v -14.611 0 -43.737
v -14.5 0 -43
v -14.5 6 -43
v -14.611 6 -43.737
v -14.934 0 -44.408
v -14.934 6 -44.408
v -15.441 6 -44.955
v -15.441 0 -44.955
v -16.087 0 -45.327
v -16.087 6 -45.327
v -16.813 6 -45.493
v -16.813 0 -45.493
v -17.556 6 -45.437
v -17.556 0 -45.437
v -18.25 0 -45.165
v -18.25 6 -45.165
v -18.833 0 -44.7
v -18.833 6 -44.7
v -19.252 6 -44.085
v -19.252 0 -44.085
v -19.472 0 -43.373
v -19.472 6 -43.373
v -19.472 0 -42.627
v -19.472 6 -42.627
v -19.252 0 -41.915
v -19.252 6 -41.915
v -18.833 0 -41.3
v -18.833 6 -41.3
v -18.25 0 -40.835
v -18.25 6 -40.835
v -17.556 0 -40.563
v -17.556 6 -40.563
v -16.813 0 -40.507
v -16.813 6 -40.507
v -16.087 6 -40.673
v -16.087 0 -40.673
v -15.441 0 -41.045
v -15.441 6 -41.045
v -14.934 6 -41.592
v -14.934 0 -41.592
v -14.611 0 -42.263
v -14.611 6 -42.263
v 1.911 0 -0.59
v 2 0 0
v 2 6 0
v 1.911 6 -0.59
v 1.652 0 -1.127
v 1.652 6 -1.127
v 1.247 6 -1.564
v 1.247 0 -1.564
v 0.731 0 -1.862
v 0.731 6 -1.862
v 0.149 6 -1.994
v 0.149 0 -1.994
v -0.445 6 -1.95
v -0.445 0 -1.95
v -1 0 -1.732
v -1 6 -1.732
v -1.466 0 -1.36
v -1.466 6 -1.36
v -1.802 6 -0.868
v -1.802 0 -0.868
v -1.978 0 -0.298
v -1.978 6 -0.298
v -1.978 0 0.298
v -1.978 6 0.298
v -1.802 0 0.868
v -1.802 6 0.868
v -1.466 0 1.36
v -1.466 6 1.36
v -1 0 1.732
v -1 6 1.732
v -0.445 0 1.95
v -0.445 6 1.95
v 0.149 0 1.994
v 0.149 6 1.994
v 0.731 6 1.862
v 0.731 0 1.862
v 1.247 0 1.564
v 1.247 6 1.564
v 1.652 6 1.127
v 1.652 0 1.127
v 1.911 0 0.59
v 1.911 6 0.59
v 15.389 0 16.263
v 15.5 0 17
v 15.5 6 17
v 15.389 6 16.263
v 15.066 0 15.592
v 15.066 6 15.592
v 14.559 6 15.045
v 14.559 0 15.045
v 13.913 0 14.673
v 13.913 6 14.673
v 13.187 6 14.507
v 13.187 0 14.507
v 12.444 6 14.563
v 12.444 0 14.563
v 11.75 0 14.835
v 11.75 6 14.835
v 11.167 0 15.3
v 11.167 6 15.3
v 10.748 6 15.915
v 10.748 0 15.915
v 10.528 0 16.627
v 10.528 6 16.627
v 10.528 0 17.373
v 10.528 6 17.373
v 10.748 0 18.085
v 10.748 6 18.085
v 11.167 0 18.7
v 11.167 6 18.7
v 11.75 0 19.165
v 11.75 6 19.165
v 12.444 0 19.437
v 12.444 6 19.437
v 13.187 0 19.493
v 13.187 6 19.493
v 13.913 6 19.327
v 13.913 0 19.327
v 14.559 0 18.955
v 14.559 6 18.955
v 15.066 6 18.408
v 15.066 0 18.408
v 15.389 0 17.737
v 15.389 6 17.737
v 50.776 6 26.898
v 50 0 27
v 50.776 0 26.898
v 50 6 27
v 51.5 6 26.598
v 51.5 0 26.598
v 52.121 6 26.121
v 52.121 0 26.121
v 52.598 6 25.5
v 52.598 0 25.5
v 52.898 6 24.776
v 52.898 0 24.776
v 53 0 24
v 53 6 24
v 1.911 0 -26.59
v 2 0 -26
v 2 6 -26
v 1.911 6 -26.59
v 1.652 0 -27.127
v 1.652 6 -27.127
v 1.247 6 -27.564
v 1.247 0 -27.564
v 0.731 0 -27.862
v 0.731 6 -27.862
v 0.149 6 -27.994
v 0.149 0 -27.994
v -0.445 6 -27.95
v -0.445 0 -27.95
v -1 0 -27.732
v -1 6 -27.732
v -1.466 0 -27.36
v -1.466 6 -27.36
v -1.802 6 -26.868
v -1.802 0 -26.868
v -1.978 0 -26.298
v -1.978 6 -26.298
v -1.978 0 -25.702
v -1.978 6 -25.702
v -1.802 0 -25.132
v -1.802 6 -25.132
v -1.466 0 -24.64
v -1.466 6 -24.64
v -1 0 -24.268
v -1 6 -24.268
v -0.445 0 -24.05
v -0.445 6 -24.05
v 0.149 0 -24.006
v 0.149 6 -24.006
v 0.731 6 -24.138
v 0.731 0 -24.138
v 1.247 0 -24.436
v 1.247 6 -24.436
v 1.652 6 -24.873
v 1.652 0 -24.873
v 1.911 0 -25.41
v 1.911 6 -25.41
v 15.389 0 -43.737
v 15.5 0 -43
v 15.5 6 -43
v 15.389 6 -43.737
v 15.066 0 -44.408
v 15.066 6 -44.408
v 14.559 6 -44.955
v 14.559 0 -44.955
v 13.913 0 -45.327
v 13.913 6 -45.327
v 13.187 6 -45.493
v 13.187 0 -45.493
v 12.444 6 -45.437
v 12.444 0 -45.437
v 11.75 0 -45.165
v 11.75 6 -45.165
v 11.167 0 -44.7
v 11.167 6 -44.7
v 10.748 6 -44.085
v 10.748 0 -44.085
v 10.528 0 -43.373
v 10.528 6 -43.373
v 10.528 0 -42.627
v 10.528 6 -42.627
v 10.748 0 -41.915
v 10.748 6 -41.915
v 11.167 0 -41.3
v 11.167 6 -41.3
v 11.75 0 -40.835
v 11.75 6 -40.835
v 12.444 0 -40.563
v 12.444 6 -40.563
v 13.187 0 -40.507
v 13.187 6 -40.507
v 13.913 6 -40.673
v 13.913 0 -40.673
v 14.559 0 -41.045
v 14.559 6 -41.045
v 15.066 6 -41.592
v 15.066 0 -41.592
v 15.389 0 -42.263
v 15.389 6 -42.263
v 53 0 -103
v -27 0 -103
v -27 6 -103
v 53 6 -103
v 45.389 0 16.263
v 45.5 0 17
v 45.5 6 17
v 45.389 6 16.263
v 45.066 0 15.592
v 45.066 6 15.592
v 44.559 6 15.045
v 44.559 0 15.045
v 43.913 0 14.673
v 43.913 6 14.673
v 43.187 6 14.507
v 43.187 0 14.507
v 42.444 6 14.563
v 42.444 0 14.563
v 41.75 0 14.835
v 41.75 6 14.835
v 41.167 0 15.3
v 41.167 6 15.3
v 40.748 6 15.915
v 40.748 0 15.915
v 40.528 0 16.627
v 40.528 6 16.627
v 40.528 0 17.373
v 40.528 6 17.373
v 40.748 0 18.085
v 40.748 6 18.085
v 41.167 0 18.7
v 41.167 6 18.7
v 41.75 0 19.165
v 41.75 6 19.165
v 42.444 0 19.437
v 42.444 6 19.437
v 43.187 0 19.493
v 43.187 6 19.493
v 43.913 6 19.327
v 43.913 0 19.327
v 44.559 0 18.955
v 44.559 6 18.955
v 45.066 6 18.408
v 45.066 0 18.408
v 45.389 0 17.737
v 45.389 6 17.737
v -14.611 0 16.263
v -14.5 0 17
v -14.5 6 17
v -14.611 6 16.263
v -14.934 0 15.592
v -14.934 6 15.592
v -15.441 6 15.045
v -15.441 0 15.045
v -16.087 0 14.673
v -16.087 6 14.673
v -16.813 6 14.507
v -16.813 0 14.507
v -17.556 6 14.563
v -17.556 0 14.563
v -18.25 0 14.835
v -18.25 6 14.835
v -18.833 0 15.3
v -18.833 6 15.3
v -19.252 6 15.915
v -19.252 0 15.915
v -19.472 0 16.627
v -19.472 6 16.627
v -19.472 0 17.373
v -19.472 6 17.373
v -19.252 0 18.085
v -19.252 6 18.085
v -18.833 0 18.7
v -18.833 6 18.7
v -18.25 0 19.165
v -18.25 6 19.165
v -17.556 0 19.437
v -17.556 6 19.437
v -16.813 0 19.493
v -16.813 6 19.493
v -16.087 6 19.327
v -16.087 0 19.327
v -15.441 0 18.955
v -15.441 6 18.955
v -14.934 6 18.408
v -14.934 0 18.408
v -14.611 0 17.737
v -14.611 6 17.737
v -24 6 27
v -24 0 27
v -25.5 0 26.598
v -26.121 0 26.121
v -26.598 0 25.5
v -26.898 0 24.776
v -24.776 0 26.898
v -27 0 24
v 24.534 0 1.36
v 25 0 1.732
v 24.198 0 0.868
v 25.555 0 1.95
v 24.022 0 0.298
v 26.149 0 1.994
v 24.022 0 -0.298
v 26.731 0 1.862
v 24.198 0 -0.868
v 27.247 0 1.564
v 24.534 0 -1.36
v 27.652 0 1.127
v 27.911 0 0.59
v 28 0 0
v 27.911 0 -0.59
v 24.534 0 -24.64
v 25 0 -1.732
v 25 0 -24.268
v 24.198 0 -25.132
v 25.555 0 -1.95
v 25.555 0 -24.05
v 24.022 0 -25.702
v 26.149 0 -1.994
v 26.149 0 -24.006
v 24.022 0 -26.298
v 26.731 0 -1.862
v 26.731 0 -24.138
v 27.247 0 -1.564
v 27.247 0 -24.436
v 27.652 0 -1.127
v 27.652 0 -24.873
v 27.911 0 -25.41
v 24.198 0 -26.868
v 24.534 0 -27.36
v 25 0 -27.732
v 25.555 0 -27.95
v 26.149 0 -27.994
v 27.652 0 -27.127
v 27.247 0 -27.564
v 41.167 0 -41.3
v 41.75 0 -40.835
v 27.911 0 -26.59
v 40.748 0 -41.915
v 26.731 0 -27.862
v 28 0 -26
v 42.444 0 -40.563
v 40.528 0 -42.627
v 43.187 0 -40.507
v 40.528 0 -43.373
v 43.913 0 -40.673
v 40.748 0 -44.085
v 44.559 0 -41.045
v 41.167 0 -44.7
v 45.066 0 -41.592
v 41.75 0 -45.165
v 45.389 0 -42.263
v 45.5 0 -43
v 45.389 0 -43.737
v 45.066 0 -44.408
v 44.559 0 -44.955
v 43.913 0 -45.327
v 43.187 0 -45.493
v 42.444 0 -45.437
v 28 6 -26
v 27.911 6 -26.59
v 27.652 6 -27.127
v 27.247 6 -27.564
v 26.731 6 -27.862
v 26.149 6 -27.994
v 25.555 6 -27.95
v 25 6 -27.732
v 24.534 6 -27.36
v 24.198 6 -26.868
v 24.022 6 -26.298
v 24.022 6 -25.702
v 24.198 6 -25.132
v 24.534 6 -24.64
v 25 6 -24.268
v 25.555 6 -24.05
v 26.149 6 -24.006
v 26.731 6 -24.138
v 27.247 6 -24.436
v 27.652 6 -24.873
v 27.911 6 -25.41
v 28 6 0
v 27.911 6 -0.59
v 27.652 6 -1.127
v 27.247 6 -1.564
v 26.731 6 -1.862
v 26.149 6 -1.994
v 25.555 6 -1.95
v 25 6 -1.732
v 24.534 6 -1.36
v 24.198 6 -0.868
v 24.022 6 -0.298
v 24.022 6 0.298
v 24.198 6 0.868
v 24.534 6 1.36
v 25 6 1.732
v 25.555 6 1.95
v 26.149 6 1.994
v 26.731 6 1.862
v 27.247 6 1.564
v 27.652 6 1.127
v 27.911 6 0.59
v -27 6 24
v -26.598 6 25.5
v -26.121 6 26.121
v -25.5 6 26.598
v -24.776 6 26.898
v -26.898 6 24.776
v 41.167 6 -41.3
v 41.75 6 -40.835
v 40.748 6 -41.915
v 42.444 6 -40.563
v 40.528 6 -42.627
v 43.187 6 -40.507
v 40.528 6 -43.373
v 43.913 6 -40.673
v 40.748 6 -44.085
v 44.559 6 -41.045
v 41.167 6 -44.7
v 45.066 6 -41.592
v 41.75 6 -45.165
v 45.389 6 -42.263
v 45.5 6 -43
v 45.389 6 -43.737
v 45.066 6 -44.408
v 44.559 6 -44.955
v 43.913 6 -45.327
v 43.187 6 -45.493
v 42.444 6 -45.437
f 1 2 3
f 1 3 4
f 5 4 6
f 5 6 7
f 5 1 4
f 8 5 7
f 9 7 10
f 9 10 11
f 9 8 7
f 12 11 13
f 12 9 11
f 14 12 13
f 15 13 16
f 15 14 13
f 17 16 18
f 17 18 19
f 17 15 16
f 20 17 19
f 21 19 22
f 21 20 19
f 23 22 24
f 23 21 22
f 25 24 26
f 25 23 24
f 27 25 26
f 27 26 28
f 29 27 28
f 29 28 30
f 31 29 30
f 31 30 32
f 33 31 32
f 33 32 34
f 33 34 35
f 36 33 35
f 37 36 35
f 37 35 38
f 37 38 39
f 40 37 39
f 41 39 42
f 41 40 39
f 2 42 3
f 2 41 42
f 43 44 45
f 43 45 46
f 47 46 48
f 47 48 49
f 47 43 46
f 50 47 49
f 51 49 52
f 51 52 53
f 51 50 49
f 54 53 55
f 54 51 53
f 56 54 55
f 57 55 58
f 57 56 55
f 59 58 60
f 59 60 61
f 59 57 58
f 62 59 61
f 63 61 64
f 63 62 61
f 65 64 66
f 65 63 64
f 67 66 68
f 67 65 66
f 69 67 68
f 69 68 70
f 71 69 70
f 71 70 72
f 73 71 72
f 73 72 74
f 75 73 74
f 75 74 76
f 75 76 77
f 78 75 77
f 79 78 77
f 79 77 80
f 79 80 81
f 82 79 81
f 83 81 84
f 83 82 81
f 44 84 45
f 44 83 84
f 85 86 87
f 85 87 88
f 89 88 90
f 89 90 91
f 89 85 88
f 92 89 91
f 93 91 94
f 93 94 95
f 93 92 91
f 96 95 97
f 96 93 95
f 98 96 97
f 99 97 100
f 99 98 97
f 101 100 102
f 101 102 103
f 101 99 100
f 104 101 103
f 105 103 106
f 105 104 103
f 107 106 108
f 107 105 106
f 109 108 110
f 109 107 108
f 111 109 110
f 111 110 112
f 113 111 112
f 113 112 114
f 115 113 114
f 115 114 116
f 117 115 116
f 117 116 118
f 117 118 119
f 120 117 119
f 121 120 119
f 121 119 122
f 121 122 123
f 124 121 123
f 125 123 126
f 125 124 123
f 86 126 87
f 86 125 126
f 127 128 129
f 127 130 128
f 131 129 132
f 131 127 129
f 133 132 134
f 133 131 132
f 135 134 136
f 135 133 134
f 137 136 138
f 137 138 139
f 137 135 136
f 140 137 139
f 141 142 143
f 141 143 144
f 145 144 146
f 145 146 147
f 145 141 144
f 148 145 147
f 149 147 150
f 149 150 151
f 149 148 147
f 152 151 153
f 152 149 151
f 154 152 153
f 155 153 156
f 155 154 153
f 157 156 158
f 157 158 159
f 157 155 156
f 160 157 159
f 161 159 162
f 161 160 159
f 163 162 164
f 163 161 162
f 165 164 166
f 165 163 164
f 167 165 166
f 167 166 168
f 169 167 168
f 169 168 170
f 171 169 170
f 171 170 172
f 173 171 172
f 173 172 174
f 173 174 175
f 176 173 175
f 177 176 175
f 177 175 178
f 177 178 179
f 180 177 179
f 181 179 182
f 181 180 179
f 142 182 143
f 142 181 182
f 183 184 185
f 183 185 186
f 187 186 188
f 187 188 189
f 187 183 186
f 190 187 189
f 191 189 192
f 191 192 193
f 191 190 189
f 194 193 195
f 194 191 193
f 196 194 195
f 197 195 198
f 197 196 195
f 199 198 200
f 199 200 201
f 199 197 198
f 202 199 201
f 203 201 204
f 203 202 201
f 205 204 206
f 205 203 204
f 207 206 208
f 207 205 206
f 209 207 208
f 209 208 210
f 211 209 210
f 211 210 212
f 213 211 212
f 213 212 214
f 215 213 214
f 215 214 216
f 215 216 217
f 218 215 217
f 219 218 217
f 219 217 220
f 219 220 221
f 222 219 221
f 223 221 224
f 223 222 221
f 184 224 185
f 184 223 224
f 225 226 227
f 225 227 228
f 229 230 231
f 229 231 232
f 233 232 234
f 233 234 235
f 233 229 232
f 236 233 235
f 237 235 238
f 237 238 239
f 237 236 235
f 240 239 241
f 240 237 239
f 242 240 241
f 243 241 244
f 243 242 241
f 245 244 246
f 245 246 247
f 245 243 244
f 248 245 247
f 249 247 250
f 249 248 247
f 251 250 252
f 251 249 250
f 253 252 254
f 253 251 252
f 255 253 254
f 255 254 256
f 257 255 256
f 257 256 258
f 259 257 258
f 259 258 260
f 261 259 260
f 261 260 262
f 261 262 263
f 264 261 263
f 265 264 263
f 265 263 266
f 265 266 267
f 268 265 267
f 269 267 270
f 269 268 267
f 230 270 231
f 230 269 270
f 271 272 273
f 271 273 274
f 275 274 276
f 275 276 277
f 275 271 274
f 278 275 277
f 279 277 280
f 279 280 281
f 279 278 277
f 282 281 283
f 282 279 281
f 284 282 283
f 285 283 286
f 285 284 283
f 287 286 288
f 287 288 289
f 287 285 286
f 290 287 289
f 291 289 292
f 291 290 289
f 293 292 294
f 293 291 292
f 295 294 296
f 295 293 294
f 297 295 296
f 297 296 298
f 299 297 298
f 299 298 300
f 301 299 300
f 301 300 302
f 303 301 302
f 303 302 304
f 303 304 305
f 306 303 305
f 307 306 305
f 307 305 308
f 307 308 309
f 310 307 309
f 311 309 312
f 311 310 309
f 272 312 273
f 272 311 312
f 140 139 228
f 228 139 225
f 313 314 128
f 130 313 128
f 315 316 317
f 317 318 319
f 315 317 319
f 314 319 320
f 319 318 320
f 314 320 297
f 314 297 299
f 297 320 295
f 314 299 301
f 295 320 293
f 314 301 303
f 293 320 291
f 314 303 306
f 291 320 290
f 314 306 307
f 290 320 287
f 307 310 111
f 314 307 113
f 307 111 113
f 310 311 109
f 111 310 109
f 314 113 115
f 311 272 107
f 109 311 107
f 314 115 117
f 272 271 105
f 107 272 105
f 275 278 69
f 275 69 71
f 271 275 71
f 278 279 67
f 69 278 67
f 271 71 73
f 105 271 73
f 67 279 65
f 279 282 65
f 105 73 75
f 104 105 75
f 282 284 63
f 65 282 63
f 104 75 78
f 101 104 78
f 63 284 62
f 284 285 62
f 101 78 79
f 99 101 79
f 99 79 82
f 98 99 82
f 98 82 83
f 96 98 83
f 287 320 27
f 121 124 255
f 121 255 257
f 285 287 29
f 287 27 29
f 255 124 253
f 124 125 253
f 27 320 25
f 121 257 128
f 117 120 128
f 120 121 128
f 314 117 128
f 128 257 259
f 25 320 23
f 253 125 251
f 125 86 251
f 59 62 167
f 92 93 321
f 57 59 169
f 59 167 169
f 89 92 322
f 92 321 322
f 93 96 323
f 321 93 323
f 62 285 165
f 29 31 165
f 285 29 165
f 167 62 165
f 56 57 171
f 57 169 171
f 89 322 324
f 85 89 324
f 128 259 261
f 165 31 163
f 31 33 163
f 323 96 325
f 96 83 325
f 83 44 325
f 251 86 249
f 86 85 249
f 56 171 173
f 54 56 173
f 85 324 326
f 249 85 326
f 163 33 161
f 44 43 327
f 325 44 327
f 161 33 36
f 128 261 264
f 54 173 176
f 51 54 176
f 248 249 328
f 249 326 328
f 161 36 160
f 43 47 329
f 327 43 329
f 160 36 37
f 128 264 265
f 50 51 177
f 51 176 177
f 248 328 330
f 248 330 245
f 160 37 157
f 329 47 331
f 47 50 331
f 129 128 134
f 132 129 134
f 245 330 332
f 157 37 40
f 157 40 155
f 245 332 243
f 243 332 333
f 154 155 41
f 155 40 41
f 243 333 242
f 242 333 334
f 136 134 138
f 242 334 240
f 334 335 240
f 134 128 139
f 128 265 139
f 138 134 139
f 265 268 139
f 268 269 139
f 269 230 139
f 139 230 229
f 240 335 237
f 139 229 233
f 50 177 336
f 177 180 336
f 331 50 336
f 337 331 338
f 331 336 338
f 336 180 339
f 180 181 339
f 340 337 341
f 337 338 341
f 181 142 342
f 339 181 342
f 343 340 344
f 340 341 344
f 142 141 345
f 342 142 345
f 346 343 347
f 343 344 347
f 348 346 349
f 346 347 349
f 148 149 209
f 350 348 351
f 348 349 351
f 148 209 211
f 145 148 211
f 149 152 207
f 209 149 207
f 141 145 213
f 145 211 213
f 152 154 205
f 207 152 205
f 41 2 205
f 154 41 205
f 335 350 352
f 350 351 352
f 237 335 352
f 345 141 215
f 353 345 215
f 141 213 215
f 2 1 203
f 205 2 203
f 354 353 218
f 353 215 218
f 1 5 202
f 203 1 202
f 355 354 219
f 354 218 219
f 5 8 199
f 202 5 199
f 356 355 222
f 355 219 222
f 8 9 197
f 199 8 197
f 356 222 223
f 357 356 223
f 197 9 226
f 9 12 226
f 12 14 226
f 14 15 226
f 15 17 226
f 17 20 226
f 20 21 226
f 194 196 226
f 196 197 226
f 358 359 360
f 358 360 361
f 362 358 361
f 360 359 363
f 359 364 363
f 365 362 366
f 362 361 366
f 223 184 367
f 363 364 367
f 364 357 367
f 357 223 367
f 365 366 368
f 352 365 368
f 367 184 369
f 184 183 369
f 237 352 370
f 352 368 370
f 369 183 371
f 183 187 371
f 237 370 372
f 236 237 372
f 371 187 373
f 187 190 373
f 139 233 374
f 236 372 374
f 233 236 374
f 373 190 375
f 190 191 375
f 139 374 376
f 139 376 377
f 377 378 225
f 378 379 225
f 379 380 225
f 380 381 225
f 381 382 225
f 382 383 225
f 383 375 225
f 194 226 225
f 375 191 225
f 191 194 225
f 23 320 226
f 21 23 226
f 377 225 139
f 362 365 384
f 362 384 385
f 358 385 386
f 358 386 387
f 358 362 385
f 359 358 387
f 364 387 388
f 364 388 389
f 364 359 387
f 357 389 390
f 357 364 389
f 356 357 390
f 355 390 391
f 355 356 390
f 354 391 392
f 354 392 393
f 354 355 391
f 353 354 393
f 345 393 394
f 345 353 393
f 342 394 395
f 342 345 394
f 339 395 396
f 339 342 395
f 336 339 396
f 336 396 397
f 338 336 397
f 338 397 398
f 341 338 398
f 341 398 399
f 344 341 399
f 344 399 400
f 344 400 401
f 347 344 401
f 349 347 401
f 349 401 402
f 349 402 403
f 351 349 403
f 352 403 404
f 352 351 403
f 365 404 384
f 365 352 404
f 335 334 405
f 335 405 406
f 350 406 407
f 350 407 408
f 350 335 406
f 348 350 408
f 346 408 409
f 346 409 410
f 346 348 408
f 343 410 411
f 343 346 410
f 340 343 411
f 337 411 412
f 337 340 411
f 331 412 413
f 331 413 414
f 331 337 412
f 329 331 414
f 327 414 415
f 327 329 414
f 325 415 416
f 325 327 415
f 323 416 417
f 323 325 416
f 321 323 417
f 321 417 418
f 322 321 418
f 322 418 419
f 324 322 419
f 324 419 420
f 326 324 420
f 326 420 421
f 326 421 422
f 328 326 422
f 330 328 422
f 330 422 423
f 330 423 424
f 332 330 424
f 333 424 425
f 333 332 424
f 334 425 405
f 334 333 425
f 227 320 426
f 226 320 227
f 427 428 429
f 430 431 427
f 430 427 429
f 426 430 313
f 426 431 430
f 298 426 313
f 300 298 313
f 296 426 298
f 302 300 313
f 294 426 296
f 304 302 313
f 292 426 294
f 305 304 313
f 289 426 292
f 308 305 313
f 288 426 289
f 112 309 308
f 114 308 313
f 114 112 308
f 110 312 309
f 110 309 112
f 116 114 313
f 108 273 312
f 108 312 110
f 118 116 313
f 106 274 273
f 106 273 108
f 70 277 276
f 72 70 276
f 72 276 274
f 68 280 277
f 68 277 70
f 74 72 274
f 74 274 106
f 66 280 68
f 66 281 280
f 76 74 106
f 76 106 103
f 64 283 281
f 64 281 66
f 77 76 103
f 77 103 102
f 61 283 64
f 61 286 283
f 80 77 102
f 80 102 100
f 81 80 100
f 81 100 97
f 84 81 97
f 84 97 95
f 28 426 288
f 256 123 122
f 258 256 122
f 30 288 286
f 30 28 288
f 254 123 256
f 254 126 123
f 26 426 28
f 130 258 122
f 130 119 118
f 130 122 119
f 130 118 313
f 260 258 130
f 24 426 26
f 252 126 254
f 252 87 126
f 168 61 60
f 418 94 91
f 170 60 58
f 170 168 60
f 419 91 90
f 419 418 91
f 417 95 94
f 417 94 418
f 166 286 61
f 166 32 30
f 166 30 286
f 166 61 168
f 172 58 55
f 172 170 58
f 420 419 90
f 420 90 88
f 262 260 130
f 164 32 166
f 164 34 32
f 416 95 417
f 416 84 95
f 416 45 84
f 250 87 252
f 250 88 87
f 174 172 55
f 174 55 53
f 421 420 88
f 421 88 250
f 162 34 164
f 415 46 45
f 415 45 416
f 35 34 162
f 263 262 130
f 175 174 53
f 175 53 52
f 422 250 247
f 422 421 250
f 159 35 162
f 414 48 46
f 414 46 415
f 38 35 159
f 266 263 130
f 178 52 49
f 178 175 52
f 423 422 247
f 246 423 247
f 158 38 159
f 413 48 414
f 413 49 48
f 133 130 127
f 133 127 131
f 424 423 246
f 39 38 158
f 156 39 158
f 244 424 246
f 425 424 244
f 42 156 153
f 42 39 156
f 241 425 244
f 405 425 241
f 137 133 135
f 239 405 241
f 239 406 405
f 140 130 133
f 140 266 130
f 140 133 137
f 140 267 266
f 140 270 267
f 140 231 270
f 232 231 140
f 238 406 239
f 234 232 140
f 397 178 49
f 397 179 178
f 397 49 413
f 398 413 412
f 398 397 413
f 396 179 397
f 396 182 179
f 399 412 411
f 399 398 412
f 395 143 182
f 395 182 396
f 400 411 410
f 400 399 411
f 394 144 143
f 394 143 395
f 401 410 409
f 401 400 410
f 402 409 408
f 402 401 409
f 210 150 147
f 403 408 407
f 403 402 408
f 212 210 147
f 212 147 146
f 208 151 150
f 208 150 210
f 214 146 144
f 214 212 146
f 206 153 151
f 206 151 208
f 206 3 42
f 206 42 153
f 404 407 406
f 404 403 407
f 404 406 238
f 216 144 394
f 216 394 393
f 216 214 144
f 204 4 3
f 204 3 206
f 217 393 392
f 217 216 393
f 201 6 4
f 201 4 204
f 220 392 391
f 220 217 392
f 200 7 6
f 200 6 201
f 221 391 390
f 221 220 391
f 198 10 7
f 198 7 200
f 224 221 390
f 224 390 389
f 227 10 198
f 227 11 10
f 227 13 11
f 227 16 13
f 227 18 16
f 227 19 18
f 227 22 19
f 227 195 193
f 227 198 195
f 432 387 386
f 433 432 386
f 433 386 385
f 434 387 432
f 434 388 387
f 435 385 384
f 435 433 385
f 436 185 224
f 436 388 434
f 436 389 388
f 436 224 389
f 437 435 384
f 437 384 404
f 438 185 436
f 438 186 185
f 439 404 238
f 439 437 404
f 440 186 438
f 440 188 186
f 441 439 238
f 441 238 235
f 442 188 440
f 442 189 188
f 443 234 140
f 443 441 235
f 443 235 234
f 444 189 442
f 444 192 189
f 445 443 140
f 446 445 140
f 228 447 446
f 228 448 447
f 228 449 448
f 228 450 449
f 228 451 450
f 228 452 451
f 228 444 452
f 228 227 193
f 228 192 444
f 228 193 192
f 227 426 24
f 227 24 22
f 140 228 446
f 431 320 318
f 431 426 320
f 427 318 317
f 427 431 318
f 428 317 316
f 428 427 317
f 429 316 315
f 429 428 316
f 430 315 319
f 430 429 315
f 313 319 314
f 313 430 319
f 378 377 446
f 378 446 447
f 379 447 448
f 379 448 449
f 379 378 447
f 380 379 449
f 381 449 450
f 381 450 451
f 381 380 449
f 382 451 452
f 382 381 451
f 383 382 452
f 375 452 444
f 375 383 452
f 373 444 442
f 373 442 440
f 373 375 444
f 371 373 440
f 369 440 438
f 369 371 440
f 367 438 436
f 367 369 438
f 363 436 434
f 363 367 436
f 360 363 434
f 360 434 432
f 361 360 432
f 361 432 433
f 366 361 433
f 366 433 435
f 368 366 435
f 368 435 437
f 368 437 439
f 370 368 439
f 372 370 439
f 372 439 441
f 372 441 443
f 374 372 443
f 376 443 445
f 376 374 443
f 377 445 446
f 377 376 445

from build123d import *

# Parameters (mm, degrees)
SKETCH1_W           = 80
SKETCH1_H           = 130
SKETCH1_R           = 2
SKETCH1_R_2         = 2.5
BOSS_EXTRUDE1_DEPTH = 6
FILLET1_R           = 3


with BuildPart() as part:
    # Sketch1 → Boss-Extrude1 (new body)
    with BuildSketch(Plane(origin=(0, 0, 0), x_dir=(1, 0, 0), z_dir=(0, 1, 0))):
        with Locations((13, 38)):
            Rectangle(SKETCH1_W, SKETCH1_H)
        with Locations((0, 26)):
            Circle(SKETCH1_R, mode=Mode.SUBTRACT)
        with Locations((26, 26)):
            Circle(SKETCH1_R, mode=Mode.SUBTRACT)
        with Locations((26, 0)):
            Circle(SKETCH1_R, mode=Mode.SUBTRACT)
        Circle(SKETCH1_R, mode=Mode.SUBTRACT)
        with Locations((-17, 43)):
            Circle(SKETCH1_R_2, mode=Mode.SUBTRACT)
        with Locations((43, 43)):
            Circle(SKETCH1_R_2, mode=Mode.SUBTRACT)
        with Locations((43, -17)):
            Circle(SKETCH1_R_2, mode=Mode.SUBTRACT)
        with Locations((-17, -17)):
            Circle(SKETCH1_R_2, mode=Mode.SUBTRACT)
        with Locations((13, 43)):
            Circle(SKETCH1_R_2, mode=Mode.SUBTRACT)
        with Locations((13, -17)):
            Circle(SKETCH1_R_2, mode=Mode.SUBTRACT)
    extrude(amount=BOSS_EXTRUDE1_DEPTH)

    # Fillet1
    fillet1_edges = [part.edges().sort_by_distance(p)[0] for p in [
        (53, 3, 27),
        (-27, 3, 27),
    ]]
    fillet(fillet1_edges, radius=FILLET1_R)


solid = part.part
